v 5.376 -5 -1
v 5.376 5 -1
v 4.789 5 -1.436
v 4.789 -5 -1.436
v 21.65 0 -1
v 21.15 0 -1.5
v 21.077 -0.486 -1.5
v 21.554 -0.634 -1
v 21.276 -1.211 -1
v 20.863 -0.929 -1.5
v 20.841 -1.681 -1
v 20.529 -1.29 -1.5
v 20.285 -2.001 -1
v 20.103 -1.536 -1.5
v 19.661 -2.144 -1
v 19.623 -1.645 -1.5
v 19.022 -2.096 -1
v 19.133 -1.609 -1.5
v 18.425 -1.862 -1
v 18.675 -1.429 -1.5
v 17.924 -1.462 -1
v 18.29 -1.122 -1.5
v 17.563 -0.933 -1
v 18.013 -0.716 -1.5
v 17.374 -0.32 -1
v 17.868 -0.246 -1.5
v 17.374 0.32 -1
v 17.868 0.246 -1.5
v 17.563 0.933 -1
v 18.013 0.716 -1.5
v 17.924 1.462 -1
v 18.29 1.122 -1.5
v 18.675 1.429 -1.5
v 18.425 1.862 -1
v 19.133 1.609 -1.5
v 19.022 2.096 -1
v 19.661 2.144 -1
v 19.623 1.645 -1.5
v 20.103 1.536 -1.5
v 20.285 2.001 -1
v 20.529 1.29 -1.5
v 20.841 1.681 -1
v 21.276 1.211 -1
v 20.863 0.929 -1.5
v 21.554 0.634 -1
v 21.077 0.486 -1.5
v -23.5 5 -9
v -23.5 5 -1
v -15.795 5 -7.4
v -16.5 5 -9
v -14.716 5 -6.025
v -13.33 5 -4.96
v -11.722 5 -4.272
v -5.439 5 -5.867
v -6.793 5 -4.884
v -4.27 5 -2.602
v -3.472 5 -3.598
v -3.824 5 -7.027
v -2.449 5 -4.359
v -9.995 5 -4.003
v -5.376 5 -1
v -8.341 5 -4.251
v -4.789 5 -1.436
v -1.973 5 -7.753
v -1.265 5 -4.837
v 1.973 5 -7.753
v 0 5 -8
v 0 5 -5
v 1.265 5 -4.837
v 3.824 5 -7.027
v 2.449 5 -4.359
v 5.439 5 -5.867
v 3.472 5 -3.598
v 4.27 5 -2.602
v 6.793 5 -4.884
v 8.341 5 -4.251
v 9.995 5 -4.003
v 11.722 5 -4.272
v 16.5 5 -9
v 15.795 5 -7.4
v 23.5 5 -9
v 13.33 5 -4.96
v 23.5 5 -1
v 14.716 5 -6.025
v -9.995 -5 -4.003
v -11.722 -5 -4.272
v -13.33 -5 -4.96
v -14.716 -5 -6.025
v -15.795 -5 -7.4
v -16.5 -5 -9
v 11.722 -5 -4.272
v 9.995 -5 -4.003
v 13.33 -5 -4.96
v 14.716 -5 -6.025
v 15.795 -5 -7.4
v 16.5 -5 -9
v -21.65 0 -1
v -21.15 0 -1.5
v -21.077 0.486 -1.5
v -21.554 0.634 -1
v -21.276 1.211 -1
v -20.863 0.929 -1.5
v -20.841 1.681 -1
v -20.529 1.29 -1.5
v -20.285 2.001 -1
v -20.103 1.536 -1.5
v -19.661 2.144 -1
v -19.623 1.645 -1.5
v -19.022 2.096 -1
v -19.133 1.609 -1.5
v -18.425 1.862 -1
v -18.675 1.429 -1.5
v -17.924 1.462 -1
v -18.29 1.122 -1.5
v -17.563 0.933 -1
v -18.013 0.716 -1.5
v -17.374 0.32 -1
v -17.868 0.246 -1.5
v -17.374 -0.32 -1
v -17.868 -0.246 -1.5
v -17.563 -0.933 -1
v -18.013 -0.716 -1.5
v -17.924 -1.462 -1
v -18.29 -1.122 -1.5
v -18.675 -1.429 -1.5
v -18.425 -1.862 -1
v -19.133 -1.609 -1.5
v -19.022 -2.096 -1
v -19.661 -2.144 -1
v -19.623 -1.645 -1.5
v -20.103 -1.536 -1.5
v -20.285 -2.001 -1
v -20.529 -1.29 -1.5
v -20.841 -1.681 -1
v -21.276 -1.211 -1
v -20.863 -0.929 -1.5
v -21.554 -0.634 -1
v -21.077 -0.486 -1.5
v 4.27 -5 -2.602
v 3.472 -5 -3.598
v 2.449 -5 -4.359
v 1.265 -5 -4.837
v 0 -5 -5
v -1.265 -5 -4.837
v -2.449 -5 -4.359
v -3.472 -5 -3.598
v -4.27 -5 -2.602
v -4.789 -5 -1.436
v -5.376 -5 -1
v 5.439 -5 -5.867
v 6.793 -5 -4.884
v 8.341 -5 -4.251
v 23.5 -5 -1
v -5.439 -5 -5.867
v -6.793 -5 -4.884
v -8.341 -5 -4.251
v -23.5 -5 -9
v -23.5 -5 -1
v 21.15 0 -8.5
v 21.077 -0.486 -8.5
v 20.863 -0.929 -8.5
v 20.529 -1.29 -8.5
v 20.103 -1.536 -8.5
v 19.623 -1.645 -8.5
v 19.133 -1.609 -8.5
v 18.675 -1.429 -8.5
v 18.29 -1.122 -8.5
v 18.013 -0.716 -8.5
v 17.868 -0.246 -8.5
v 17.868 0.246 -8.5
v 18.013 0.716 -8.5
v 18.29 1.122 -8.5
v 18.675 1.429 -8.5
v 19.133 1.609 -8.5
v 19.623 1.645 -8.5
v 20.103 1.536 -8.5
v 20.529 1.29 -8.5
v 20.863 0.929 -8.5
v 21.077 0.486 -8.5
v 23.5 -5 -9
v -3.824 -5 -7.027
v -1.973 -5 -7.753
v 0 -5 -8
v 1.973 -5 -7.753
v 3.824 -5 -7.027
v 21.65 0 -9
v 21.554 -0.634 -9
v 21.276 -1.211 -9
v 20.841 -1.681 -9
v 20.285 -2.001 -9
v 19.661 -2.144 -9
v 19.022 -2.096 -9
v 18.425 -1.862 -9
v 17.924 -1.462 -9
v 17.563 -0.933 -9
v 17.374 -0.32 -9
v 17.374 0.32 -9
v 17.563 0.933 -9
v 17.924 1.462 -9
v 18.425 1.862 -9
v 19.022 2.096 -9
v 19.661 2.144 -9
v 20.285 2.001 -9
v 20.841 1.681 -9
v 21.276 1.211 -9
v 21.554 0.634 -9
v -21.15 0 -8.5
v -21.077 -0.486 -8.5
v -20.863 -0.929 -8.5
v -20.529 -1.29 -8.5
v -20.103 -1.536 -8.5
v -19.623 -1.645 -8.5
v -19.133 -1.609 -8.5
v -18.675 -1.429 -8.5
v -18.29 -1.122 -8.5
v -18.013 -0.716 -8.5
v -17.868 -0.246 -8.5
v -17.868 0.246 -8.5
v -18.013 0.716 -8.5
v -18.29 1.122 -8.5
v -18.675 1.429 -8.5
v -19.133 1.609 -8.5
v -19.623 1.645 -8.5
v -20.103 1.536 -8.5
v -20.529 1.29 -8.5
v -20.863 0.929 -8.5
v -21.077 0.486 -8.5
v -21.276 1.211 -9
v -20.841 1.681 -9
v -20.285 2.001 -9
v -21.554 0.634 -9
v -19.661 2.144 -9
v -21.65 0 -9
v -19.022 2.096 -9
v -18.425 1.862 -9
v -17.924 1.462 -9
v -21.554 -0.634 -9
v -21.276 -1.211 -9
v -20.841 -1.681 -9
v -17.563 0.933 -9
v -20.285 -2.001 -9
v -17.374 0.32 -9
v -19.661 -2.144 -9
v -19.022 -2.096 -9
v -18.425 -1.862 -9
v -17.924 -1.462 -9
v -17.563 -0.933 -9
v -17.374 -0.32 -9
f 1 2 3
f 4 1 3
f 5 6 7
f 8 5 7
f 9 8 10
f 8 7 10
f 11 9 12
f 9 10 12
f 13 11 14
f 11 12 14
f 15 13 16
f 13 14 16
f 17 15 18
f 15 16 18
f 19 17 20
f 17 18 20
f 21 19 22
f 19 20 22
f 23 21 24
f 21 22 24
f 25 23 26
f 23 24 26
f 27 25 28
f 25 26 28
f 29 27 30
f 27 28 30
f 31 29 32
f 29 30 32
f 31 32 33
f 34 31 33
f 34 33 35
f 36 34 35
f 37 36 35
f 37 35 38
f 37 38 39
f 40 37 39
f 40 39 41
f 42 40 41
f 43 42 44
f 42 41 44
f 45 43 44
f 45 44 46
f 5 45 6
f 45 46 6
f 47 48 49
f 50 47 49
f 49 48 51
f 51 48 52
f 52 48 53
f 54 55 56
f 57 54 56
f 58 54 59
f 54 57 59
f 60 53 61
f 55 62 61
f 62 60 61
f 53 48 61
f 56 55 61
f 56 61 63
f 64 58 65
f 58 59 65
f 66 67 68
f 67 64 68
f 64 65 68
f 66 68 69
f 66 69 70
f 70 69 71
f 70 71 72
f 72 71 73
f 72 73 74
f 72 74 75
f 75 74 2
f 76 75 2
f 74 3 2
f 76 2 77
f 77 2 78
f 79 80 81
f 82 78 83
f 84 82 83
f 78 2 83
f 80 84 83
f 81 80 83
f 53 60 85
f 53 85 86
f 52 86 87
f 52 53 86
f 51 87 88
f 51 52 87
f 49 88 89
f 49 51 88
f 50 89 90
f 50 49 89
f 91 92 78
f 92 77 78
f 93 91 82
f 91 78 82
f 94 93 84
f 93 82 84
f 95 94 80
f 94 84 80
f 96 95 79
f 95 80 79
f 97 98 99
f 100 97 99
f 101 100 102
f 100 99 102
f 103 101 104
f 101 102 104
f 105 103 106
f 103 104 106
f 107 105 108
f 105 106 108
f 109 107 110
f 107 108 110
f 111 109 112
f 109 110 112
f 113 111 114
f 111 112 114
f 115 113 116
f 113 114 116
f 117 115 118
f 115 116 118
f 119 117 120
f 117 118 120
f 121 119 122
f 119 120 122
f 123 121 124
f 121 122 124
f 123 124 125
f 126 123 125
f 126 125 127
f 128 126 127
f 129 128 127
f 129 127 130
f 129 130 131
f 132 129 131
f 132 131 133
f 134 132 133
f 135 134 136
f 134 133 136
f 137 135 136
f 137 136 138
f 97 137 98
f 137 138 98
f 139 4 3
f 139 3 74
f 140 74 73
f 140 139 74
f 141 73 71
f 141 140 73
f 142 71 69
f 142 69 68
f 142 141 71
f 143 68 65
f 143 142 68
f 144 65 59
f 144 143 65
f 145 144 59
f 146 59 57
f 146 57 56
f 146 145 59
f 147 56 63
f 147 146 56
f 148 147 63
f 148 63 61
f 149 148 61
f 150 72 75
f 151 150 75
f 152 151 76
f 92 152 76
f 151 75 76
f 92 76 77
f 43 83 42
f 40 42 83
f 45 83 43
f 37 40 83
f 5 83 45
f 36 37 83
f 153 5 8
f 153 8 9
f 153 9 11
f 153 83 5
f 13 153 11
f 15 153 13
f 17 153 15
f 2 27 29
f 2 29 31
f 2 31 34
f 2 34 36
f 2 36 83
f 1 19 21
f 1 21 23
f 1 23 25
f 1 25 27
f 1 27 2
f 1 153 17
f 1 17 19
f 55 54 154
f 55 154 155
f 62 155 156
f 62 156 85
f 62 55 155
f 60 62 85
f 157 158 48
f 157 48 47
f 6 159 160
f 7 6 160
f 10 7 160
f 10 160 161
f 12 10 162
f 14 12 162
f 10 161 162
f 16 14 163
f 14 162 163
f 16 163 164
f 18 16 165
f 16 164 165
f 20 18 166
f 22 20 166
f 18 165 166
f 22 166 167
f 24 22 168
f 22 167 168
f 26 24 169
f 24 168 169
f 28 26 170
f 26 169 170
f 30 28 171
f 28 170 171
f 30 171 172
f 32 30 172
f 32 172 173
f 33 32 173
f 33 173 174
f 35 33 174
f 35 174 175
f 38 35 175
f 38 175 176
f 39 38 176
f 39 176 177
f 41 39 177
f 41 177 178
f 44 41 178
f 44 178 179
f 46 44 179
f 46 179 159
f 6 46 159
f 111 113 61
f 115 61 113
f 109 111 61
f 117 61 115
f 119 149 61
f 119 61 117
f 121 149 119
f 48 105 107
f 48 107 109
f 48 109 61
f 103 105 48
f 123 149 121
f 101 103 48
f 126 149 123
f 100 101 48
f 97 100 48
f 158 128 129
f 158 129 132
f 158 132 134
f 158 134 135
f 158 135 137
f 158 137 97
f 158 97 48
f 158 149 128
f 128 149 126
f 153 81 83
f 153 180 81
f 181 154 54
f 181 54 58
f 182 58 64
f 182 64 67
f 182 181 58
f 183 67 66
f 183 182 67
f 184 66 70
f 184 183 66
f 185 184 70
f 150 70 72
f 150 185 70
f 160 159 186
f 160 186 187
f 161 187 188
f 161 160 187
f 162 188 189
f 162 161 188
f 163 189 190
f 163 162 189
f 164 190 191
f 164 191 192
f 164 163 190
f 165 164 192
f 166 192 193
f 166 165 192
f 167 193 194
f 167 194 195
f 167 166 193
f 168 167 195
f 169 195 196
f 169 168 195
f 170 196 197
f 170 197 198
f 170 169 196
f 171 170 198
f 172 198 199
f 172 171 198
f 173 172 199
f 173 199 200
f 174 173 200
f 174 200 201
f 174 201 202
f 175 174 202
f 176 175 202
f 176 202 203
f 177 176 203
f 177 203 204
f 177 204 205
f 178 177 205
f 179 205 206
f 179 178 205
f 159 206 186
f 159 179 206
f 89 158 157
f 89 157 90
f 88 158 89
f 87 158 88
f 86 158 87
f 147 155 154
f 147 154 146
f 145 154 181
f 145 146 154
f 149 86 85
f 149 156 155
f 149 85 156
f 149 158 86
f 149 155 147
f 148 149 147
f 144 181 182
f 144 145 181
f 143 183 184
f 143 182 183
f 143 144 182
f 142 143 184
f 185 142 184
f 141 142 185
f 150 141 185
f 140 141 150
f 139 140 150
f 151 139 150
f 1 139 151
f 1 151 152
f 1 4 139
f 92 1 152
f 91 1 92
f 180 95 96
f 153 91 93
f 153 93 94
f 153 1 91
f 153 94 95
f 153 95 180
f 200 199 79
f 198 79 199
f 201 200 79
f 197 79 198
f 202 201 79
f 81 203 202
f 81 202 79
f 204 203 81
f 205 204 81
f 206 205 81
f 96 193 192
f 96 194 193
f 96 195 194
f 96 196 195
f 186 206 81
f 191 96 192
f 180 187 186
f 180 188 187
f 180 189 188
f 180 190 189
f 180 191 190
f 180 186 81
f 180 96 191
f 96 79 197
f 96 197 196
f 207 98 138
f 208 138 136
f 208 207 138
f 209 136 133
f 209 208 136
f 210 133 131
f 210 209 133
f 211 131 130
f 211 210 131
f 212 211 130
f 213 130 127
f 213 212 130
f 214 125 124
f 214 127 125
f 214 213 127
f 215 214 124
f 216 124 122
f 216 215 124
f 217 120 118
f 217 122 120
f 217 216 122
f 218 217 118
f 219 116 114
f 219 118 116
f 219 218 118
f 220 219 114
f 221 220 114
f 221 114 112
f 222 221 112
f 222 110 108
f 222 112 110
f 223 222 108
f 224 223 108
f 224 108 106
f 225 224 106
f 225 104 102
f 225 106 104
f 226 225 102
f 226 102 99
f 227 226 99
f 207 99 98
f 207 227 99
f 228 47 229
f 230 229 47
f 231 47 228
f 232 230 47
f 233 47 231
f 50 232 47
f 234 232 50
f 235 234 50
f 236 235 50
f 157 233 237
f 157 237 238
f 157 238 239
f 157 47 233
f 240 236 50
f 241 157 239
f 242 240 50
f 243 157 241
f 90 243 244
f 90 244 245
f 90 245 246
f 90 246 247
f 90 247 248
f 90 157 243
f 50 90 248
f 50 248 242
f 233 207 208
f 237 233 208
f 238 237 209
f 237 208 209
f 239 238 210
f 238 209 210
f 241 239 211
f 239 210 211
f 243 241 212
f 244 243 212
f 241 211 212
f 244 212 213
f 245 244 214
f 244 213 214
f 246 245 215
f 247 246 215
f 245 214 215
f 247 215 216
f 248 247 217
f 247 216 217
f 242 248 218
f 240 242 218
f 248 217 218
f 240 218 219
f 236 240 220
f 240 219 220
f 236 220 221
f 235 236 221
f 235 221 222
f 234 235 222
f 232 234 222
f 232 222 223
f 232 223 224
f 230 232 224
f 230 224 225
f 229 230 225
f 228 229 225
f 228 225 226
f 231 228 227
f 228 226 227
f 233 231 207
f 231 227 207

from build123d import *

# Parameters (mm, degrees)
F1_DEPTH    = 5
F3_T1_DEPTH = 5
F3_T3_DEPTH = 5
F4_T1_DEPTH = 6.2324692544
F4_T3_DEPTH = 6.2324692544
F2_R        = 1.65
F5_DEPTH    = 8.001
F6_SIZE     = 0.5


# Not quite as in the source:
# - a fillet or chamfer that OpenCascade refuses, or shapes differently, is made with other operations: its cross-section is extruded or revolved along the edge and cut away or added
# - a pattern or mirror of a feature is missing from the dataset's text; its kind, count and spacing are read off the source's solid


with BuildPart() as f1:
    # F0 (on Front) → F1 (new body, symmetric)
    with BuildSketch(Plane.XZ):
        with BuildLine():
            Line((23.5, -9), (23.5, -1))
            Line((23.5, -1), (4.8989794856, -1))
            ThreePointArc((4.8989794856, -1), (3.1622776602, -3.8729833462), (0, -5))
            ThreePointArc((0, -5), (-3.1622776602, -3.8729833462), (-4.8989794856, -1))
            Line((-4.8989794856, -1), (-23.5, -1))
            Line((-23.5, -1), (-23.5, -9))
            Line((-23.5, -9), (-16.5, -9))
            Line((-16.5, -9), (-16.5, -4))
            Line((-16.5, -4), (-6.9282032303, -4))
            ThreePointArc((-6.9282032303, -4), (-4, -6.9282032303), (0, -8))
            ThreePointArc((0, -8), (4, -6.9282032303), (6.9282032303, -4))
            Line((6.9282032303, -4), (16.5, -4))
            Line((16.5, -4), (16.5, -9))
            Line((16.5, -9), (23.5, -9))
        make_face()
    extrude(amount=F1_DEPTH, both=True)

    # F3: fillet of radius 7 on 8 edges, made by hand

    # F3_s2 → F3_t1 (join)
    with BuildSketch(Plane.XZ.offset(-5)):
        with BuildLine():
            ThreePointArc((9.7917960675, -4), (13.9750962002, -5.3875139198), (16.5, -9))
            Line((16.5, -9), (16.5, -4))
            Line((16.5, -4), (9.7917960675, -4))
        make_face()
        with BuildLine():
            ThreePointArc((5.4389541478, -5.8666666667), (7.6420004255, -4.4833546462), (10.1980390272, -4))
            Line((10.1980390272, -4), (6.9282032303, -4))
            ThreePointArc((6.9282032303, -4), (6.2536194731, -4.989212712), (5.4389541478, -5.8666666667))
        make_face()
        with BuildLine():
            ThreePointArc((-9.7917960675, -4), (-13.9750962002, -5.3875139198), (-16.5, -9))
            Line((-16.5, -9), (-16.5, -4))
            Line((-16.5, -4), (-9.7917960675, -4))
        make_face()
        with BuildLine():
            ThreePointArc((-5.4389541478, -5.8666666667), (-7.6420004255, -4.4833546462), (-10.1980390272, -4))
            Line((-10.1980390272, -4), (-6.9282032303, -4))
            ThreePointArc((-6.9282032303, -4), (-6.2536194731, -4.989212712), (-5.4389541478, -5.8666666667))
        make_face()
    extrude(amount=F3_T1_DEPTH)

    # F3_s4 → F3_t3 (join)
    with BuildSketch(Plane.XZ):
        with BuildLine():
            ThreePointArc((9.7917960675, -4), (13.9750962002, -5.3875139198), (16.5, -9))
            Line((16.5, -9), (16.5, -4))
            Line((16.5, -4), (9.7917960675, -4))
        make_face()
        with BuildLine():
            ThreePointArc((5.4389541478, -5.8666666667), (7.6420004255, -4.4833546462), (10.1980390272, -4))
            Line((10.1980390272, -4), (6.9282032303, -4))
            ThreePointArc((6.9282032303, -4), (6.2536194731, -4.989212712), (5.4389541478, -5.8666666667))
        make_face()
        with BuildLine():
            ThreePointArc((-9.7917960675, -4), (-13.9750962002, -5.3875139198), (-16.5, -9))
            Line((-16.5, -9), (-16.5, -4))
            Line((-16.5, -4), (-9.7917960675, -4))
        make_face()
        with BuildLine():
            ThreePointArc((-5.4389541478, -5.8666666667), (-7.6420004255, -4.4833546462), (-10.1980390272, -4))
            Line((-10.1980390272, -4), (-6.9282032303, -4))
            ThreePointArc((-6.9282032303, -4), (-6.2536194731, -4.989212712), (-5.4389541478, -5.8666666667))
        make_face()
    extrude(amount=F3_T3_DEPTH)

    # F4: chamfer of 0.5 on 4 edges, made by hand

    # F4_s2 → F4_t1 (cut)
    with BuildSketch(Plane.XZ.offset(-6.2324692544)):
        with BuildLine():
            Line((-4.7731743681, -1.4483837223), (-5.3918225964, -0.9880608955))
            Line((-5.3918225964, -0.9880608955), (-5.3918225964, -0.9780608955))
            ThreePointArc((-5.3918225964, -0.9780608955), (-5.145401041, -0.99), (-4.8989794856, -0.99))
            Line((-4.8989794856, -0.99), (-4.8891815266, -0.998))
            ThreePointArc((-4.8891815266, -0.998), (-4.8374189809, -1.2245315852), (-4.7635959284, -1.445510833))
            Line((-4.7635959284, -1.445510833), (-4.7731743681, -1.4483837223))
        make_face()
        with BuildLine():
            Line((5.3918225964, -0.9880608955), (4.7731743681, -1.4483837223))
            Line((4.7731743681, -1.4483837223), (4.7635959284, -1.445510833))
            ThreePointArc((4.7635959284, -1.445510833), (4.8374189809, -1.2245315852), (4.8891815266, -0.998))
            Line((4.8891815266, -0.998), (4.8989794856, -0.99))
            ThreePointArc((4.8989794856, -0.99), (5.145401041, -0.99), (5.3918225964, -0.9780608955))
            Line((5.3918225964, -0.9780608955), (5.3918225964, -0.9880608955))
        make_face()
    extrude(amount=F4_T1_DEPTH, mode=Mode.SUBTRACT)

    # F4_s4 → F4_t3 (cut)
    with BuildSketch(Plane.XZ):
        with BuildLine():
            Line((-4.7731743681, -1.4483837223), (-5.3918225964, -0.9880608955))
            Line((-5.3918225964, -0.9880608955), (-5.3918225964, -0.9780608955))
            ThreePointArc((-5.3918225964, -0.9780608955), (-5.145401041, -0.99), (-4.8989794856, -0.99))
            Line((-4.8989794856, -0.99), (-4.8891815266, -0.998))
            ThreePointArc((-4.8891815266, -0.998), (-4.8374189809, -1.2245315852), (-4.7635959284, -1.445510833))
            Line((-4.7635959284, -1.445510833), (-4.7731743681, -1.4483837223))
        make_face()
        with BuildLine():
            Line((5.3918225964, -0.9880608955), (4.7731743681, -1.4483837223))
            Line((4.7731743681, -1.4483837223), (4.7635959284, -1.445510833))
            ThreePointArc((4.7635959284, -1.445510833), (4.8374189809, -1.2245315852), (4.8891815266, -0.998))
            Line((4.8891815266, -0.998), (4.8989794856, -0.99))
            ThreePointArc((4.8989794856, -0.99), (5.145401041, -0.99), (5.3918225964, -0.9780608955))
            Line((5.3918225964, -0.9780608955), (5.3918225964, -0.9880608955))
        make_face()
    extrude(amount=F4_T3_DEPTH, mode=Mode.SUBTRACT)

    # F2 (on face) → F5 (cut, through all)
    with BuildSketch(Plane(origin=(0, 0, -9), x_dir=(1, 0, 0), z_dir=(0, 0, -1))):
        with Locations((19.5, 0)):
            Circle(F2_R)
    f5 = extrude(amount=-F5_DEPTH, mode=Mode.SUBTRACT)

    # F5_copies: F5 across plane
    add(f5.mirror(Plane(origin=(0, 0, 0), x_dir=(0, 0, -1), z_dir=(-1, 0, 0))), mode=Mode.SUBTRACT)

    # F6
    f6_edges = [f1.edges().sort_by_distance(p)[0] for p in [
        (19.5, 1.65, -9),
        (19.5, -1.65, -9),
        (19.5, 1.65, -1),
        (-19.5, 1.65, -9),
        (-19.5, 1.65, -1),
        (-19.5, -1.65, -9),
        (-19.5, -1.65, -1),
        (19.5, -1.65, -1),
    ]]
    chamfer(f6_edges, length=F6_SIZE)


solid = f1.part
